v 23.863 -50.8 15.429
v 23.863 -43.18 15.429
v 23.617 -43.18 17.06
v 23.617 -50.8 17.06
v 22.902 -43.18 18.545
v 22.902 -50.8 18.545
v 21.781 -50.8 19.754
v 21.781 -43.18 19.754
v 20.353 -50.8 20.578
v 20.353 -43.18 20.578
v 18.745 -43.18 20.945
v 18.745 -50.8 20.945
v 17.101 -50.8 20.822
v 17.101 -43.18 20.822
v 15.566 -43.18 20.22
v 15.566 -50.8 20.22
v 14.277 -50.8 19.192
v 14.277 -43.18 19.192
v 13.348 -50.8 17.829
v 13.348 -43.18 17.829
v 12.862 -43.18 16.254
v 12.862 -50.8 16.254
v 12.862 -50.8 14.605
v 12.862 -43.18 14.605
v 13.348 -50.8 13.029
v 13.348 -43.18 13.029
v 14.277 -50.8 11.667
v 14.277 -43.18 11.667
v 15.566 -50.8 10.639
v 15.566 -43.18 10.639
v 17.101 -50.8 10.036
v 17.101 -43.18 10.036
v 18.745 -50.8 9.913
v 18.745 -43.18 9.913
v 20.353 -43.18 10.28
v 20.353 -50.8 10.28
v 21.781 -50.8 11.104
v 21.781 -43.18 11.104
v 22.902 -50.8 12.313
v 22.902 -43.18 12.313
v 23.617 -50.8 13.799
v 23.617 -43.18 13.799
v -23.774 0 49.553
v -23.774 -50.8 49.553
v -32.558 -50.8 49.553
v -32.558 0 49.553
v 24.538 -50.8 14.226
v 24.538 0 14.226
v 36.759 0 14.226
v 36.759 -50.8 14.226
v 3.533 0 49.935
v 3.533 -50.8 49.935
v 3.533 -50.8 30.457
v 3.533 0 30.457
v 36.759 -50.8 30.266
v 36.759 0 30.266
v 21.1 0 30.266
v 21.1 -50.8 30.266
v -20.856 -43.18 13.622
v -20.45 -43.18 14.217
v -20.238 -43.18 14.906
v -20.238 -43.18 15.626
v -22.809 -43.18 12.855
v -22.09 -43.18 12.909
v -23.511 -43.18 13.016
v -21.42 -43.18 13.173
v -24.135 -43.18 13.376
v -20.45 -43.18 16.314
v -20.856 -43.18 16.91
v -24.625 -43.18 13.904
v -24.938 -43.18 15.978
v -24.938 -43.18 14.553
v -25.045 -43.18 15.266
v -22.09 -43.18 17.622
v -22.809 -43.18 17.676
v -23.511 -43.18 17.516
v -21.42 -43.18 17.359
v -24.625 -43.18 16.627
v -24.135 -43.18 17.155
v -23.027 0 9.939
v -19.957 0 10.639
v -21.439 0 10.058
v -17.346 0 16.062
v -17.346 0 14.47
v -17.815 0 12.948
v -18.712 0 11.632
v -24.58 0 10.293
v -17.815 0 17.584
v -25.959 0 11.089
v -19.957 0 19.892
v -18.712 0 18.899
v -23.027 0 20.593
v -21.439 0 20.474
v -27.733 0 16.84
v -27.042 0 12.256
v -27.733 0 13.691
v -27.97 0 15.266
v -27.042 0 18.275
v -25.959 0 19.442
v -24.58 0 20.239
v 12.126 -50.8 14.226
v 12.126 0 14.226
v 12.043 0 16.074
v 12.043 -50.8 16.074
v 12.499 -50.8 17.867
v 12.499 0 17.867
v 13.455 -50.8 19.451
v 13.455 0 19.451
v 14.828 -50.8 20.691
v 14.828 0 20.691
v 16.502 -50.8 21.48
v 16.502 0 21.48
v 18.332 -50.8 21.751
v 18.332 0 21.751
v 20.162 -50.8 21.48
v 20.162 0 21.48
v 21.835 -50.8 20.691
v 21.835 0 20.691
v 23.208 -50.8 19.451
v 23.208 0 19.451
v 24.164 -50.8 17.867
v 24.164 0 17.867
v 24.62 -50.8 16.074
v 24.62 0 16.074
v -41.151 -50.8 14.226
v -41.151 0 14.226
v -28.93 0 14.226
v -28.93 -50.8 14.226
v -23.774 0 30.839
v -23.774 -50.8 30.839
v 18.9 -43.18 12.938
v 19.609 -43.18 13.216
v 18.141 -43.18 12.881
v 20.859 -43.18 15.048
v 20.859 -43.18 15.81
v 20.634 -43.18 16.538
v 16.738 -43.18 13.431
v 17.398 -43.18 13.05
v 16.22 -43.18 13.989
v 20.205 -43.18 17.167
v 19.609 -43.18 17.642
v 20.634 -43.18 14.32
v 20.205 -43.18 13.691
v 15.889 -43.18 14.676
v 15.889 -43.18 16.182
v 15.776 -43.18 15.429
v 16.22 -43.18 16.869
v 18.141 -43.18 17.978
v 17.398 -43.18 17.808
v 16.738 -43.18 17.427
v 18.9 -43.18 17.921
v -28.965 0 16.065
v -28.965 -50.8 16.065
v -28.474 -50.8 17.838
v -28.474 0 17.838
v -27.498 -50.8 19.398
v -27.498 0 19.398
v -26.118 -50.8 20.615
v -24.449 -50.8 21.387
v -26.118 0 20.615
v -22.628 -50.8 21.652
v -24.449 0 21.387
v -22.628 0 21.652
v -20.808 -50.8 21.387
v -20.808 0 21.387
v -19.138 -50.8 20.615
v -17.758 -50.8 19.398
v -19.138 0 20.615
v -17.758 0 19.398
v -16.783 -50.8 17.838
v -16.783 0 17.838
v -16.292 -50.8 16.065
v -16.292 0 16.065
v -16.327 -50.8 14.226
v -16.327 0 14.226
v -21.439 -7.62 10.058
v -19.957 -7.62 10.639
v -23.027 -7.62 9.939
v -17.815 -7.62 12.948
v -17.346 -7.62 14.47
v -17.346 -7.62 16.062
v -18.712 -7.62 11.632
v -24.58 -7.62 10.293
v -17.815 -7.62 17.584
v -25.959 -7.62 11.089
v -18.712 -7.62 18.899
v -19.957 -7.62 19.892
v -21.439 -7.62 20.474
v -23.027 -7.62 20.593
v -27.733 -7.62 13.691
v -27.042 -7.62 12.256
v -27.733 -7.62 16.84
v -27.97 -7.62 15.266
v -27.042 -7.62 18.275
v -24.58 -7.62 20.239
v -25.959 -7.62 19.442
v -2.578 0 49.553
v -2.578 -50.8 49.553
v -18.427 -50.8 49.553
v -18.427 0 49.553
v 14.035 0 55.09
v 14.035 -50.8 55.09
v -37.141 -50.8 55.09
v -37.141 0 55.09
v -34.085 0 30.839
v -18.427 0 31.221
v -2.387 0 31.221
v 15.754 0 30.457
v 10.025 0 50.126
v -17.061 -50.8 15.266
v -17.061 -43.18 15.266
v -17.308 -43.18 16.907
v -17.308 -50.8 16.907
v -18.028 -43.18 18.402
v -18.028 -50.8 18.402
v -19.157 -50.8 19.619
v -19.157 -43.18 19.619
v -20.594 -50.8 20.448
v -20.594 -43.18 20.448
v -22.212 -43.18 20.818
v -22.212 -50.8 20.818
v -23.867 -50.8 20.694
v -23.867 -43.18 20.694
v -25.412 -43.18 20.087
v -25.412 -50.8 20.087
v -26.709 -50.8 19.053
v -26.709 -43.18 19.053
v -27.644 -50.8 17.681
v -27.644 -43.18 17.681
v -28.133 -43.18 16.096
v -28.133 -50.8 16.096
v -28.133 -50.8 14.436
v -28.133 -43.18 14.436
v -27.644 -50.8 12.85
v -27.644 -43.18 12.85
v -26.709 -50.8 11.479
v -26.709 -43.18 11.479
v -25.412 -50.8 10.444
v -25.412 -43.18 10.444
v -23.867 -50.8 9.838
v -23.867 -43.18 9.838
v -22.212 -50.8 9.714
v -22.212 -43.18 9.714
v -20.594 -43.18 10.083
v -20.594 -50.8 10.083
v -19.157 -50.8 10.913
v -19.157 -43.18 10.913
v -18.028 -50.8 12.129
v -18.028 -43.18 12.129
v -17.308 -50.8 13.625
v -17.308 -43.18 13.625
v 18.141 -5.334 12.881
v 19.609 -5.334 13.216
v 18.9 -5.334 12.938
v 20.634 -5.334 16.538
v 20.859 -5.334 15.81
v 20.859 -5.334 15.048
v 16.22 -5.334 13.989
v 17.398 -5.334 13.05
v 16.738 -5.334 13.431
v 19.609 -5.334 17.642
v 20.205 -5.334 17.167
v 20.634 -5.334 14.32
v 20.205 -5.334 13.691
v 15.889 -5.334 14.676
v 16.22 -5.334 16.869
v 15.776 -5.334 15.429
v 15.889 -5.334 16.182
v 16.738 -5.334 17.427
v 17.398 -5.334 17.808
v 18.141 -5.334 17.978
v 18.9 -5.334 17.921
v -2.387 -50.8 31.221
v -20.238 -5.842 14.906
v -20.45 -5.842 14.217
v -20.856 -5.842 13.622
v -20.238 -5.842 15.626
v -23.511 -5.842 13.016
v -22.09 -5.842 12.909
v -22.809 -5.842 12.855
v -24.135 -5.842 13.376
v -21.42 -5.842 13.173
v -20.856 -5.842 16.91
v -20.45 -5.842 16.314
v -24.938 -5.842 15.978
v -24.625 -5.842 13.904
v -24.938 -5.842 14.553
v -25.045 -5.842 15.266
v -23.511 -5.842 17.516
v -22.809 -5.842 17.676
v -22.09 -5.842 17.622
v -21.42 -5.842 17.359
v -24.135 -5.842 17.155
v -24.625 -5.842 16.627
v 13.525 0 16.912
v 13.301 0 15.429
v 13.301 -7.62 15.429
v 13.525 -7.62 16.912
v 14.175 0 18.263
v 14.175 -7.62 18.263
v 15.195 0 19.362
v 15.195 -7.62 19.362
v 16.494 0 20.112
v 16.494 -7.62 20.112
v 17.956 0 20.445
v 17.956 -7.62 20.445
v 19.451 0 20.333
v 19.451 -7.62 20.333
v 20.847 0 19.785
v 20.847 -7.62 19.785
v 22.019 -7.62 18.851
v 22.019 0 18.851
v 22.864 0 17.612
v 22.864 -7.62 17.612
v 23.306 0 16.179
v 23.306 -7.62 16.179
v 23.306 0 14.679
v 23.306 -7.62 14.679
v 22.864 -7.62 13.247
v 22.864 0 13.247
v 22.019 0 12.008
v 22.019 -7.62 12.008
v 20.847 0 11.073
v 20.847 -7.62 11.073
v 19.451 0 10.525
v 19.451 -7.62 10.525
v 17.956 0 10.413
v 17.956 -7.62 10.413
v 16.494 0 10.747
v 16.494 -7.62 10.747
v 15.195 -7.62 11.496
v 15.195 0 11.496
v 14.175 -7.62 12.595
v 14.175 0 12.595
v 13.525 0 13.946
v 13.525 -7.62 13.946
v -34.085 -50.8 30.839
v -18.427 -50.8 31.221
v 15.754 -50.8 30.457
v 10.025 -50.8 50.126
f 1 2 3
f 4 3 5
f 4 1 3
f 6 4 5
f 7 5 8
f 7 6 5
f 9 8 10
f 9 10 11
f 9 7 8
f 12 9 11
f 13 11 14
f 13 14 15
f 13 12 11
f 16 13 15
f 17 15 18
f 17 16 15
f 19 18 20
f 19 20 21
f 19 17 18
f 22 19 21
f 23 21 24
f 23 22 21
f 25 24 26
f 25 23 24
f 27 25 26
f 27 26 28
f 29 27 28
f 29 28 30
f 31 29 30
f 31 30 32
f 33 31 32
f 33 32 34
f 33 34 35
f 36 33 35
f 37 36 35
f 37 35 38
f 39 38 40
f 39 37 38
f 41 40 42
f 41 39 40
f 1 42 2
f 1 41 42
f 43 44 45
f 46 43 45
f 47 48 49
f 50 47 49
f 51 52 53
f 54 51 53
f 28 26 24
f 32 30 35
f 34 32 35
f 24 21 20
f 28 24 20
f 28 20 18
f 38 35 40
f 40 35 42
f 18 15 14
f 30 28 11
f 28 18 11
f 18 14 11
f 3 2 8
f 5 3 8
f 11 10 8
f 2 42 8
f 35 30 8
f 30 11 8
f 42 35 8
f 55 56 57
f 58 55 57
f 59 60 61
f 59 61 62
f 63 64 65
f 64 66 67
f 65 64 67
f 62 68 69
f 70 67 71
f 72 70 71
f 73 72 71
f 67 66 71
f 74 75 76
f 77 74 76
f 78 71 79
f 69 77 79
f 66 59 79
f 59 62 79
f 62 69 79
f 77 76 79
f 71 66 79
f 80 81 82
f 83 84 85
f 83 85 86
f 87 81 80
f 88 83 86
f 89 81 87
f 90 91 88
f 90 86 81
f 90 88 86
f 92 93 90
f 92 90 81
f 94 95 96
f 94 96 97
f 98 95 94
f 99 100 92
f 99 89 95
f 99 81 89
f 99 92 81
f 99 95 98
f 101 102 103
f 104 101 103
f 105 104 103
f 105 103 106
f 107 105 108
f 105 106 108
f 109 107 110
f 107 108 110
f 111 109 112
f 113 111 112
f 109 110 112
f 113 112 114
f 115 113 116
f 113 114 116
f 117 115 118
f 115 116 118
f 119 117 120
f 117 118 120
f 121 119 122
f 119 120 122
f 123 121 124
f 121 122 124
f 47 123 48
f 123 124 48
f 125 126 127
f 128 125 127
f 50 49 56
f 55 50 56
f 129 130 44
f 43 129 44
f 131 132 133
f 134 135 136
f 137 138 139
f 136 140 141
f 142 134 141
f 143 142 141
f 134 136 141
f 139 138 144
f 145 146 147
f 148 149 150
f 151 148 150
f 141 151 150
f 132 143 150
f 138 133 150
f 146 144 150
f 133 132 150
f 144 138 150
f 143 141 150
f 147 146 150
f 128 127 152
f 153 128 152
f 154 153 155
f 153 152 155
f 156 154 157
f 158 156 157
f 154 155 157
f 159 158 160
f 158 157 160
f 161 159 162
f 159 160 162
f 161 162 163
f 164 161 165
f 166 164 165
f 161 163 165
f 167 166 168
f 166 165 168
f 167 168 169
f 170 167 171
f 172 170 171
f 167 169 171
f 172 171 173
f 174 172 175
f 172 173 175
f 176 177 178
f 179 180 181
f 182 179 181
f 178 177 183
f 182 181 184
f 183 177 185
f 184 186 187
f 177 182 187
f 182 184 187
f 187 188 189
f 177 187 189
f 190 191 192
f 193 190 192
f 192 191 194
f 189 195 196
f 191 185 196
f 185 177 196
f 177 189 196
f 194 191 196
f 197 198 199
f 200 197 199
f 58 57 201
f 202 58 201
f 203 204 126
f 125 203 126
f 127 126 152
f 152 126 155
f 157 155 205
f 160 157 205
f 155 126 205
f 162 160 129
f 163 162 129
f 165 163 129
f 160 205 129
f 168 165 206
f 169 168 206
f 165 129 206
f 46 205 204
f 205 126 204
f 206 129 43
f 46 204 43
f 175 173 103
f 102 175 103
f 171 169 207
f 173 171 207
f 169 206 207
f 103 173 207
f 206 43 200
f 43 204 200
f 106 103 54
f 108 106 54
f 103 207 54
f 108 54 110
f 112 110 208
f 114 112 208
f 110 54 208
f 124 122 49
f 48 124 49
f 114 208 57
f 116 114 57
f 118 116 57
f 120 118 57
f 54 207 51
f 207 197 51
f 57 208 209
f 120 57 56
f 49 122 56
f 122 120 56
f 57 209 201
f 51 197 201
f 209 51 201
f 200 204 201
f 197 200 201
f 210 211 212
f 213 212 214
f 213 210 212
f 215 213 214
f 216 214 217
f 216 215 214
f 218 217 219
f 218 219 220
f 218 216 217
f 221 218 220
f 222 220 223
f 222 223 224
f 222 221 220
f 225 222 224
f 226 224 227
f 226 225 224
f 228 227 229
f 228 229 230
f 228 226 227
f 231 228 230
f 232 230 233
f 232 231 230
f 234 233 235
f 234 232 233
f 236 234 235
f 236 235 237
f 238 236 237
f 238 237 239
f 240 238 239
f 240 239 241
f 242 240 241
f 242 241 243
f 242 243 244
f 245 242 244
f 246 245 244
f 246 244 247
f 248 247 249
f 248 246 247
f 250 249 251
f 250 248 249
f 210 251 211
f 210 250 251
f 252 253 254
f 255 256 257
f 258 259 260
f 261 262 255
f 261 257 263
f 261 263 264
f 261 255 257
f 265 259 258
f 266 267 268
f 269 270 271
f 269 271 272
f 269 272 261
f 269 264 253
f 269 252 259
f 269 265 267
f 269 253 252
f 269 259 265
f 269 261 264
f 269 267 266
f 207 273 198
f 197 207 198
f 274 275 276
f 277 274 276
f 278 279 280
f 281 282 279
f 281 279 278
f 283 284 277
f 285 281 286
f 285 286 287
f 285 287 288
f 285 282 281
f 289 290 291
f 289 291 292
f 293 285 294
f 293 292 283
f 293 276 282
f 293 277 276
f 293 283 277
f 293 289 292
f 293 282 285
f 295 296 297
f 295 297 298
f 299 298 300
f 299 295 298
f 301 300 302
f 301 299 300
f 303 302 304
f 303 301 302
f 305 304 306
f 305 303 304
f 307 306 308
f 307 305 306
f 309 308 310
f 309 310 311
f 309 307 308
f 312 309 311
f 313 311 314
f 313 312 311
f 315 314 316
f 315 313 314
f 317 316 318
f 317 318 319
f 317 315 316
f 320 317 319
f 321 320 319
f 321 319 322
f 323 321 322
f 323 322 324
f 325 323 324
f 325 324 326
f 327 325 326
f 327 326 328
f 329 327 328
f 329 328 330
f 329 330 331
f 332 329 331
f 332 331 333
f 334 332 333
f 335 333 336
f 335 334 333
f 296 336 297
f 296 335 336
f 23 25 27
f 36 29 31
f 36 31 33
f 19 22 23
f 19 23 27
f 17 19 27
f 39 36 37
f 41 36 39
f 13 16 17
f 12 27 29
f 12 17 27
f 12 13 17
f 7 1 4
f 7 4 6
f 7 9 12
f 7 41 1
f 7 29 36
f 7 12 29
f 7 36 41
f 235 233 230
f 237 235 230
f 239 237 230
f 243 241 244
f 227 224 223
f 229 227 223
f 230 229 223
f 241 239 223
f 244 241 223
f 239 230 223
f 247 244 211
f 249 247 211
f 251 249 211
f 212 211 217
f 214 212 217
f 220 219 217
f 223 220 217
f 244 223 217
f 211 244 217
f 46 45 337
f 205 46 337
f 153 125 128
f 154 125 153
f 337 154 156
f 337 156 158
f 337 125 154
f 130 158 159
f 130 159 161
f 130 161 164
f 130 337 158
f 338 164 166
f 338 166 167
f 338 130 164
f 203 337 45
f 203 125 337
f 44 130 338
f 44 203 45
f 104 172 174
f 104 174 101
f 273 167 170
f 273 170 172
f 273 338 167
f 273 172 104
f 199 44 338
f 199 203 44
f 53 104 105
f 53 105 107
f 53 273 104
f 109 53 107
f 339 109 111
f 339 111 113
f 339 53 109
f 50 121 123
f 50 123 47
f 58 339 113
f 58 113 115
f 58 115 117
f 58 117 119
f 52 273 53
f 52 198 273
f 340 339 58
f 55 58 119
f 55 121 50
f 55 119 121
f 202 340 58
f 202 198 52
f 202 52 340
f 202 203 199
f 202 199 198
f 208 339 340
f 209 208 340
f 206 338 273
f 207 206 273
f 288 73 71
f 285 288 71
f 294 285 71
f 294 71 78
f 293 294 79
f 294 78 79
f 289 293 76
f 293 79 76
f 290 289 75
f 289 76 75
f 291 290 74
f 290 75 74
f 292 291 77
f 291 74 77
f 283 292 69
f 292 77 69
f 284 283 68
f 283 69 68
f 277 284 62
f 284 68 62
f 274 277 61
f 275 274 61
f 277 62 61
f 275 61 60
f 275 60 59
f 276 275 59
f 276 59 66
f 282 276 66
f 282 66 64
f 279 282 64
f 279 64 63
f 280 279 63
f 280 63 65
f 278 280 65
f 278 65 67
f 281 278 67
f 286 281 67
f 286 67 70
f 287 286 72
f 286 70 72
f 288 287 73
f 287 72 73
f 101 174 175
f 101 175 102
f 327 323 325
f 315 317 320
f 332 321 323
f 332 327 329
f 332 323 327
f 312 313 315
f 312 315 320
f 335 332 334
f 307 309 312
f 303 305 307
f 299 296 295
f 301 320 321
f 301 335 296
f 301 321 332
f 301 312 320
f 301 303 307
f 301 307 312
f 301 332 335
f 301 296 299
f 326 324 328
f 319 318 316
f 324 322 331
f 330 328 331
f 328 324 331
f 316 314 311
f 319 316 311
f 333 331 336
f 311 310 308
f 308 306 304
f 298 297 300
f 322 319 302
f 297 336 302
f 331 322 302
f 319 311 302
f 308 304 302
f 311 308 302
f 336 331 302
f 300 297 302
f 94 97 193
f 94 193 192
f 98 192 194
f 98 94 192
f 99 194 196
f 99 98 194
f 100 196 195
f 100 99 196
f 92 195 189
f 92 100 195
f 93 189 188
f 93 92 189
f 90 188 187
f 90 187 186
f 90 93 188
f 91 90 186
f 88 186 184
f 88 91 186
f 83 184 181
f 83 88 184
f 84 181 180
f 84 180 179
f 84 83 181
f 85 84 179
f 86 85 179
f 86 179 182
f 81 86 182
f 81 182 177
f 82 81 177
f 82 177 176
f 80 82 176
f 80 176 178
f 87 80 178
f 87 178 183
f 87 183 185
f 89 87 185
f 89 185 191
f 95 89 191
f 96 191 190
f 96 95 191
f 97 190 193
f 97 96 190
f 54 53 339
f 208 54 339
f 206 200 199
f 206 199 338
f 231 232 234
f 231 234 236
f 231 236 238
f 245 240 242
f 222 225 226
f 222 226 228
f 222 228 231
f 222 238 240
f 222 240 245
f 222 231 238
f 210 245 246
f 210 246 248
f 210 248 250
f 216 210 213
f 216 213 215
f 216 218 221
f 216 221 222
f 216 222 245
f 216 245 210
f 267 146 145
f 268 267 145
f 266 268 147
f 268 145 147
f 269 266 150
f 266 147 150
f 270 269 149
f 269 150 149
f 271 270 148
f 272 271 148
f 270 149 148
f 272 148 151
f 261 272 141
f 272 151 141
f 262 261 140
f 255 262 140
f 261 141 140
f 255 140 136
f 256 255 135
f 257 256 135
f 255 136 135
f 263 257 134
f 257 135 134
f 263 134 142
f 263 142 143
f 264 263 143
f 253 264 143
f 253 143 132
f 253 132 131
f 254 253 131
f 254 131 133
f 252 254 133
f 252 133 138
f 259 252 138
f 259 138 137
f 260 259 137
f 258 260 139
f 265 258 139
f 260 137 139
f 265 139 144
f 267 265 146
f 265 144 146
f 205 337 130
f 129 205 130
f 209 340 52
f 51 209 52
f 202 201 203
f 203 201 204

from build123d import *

# Parameters (mm, degrees)
F1_DEPTH  = 50.8
F3_DEPTH  = 50.8
F5_DEPTH  = 50.8
F7_DEPTH  = 50.8
F8_R      = 5.56752
F9_DEPTH  = 7.62
F10_R     = 5.03027
F11_DEPTH = 7.62
F12_R     = 5.531557
F13_DEPTH = 7.62
F14_R     = 5.342098
F15_DEPTH = 7.62
F16_R     = 2.417035
F17_DEPTH = 37.338
F18_R     = 2.555691
F19_DEPTH = 37.846


with BuildPart() as f1:
    # F0 (on Front) → F1 (new body)
    with BuildSketch(Plane.XZ):
        with BuildLine():
            Line((-37.140679, 55.09042), (-41.15073, 14.226122))
            Line((-41.15073, 14.226122), (-28.92963, 14.226122))
            ThreePointArc((-28.92963, 14.226122), (-22.628127, 21.652453), (-16.326623, 14.226122))
            Line((-16.326623, 14.226122), (12.125621, 14.226122))
            ThreePointArc((12.125621, 14.226122), (18.331646, 21.750687), (24.537671, 14.226122))
            Line((24.537671, 14.226122), (36.758773, 14.226122))
            Line((36.758773, 14.226122), (36.758773, 30.266313))
            Line((36.758773, 30.266313), (21.100489, 30.266313))
            Line((21.100489, 30.266313), (14.035167, 55.09042))
            Line((14.035167, 55.09042), (-34.085404, 55.09042))
            Line((-34.085404, 55.09042), (-37.140679, 55.09042))
        make_face()
    extrude(amount=F1_DEPTH)

    # F2 (on face) → F3 (cut)
    with BuildSketch(Plane.XZ.offset(50.8)):
        Polygon((15.753761, 30.457268), (10.025118, 50.125599), (3.53266, 49.934644), (3.53266, 30.457268), align=None)
    extrude(amount=-F3_DEPTH, mode=Mode.SUBTRACT)

    # F4 (on face) → F5 (cut)
    with BuildSketch(Plane.XZ.offset(50.8)):
        Polygon((-18.427124, 31.221086), (-2.386934, 31.221086), (-2.577888, 49.552731), (-18.427124, 49.552731), align=None)
    extrude(amount=-F5_DEPTH, mode=Mode.SUBTRACT)

    # F6 (on face) → F7 (cut)
    with BuildSketch(Plane.XZ.offset(50.8)):
        Polygon((-23.773855, 30.839179), (-23.773855, 49.552731), (-32.557767, 49.552731), (-34.085404, 30.839179), align=None)
    extrude(amount=-F7_DEPTH, mode=Mode.SUBTRACT)


with BuildPart() as f9:
    # F8 (on face) → F9 (new body)
    with BuildSketch(Plane.XZ.offset(50.8)):
        with Locations((-22.628127, 15.265764)):
            Circle(F8_R)
    extrude(amount=-F9_DEPTH)


with BuildPart() as f11:
    # F10 (on face) → F11 (new body)
    with BuildSketch(Plane(origin=(0, 0, 0), x_dir=(-1, 0, 0), z_dir=(0, 1, 0))):
        with Locations((-18.331646, 15.429137)):
            Circle(F10_R)
    extrude(amount=-F11_DEPTH)


with BuildPart() as f13:
    # F12 (on face) → F13 (new body)
    with BuildSketch(Plane.XZ.offset(50.8)):
        with Locations((18.331646, 15.429137)):
            Circle(F12_R)
    extrude(amount=-F13_DEPTH)


with BuildPart() as f15:
    # F14 (on face) → F15 (new body)
    with BuildSketch(Plane(origin=(0, 0, 0), x_dir=(-1, 0, 0), z_dir=(0, 1, 0))):
        with Locations((22.628127, 15.265764)):
            Circle(F14_R)
    extrude(amount=-F15_DEPTH)


with BuildPart() as f17:
    # F16 (on face) → F17 (new body)
    with BuildSketch(Plane(origin=(0, -43.18, 0), x_dir=(-1, 0, 0), z_dir=(0, 1, 0))):
        with Locations((22.628127, 15.265764)):
            Circle(F16_R)
    extrude(amount=F17_DEPTH)


with BuildPart() as f19:
    # F18 (on face) → F19 (new body)
    with BuildSketch(Plane(origin=(0, -43.18, 0), x_dir=(-1, 0, 0), z_dir=(0, 1, 0))):
        with Locations((-18.331646, 15.429137)):
            Circle(F18_R)
    extrude(amount=F19_DEPTH)


solid = Compound([f1.part, f9.part, f11.part, f13.part, f15.part, f17.part, f19.part])
